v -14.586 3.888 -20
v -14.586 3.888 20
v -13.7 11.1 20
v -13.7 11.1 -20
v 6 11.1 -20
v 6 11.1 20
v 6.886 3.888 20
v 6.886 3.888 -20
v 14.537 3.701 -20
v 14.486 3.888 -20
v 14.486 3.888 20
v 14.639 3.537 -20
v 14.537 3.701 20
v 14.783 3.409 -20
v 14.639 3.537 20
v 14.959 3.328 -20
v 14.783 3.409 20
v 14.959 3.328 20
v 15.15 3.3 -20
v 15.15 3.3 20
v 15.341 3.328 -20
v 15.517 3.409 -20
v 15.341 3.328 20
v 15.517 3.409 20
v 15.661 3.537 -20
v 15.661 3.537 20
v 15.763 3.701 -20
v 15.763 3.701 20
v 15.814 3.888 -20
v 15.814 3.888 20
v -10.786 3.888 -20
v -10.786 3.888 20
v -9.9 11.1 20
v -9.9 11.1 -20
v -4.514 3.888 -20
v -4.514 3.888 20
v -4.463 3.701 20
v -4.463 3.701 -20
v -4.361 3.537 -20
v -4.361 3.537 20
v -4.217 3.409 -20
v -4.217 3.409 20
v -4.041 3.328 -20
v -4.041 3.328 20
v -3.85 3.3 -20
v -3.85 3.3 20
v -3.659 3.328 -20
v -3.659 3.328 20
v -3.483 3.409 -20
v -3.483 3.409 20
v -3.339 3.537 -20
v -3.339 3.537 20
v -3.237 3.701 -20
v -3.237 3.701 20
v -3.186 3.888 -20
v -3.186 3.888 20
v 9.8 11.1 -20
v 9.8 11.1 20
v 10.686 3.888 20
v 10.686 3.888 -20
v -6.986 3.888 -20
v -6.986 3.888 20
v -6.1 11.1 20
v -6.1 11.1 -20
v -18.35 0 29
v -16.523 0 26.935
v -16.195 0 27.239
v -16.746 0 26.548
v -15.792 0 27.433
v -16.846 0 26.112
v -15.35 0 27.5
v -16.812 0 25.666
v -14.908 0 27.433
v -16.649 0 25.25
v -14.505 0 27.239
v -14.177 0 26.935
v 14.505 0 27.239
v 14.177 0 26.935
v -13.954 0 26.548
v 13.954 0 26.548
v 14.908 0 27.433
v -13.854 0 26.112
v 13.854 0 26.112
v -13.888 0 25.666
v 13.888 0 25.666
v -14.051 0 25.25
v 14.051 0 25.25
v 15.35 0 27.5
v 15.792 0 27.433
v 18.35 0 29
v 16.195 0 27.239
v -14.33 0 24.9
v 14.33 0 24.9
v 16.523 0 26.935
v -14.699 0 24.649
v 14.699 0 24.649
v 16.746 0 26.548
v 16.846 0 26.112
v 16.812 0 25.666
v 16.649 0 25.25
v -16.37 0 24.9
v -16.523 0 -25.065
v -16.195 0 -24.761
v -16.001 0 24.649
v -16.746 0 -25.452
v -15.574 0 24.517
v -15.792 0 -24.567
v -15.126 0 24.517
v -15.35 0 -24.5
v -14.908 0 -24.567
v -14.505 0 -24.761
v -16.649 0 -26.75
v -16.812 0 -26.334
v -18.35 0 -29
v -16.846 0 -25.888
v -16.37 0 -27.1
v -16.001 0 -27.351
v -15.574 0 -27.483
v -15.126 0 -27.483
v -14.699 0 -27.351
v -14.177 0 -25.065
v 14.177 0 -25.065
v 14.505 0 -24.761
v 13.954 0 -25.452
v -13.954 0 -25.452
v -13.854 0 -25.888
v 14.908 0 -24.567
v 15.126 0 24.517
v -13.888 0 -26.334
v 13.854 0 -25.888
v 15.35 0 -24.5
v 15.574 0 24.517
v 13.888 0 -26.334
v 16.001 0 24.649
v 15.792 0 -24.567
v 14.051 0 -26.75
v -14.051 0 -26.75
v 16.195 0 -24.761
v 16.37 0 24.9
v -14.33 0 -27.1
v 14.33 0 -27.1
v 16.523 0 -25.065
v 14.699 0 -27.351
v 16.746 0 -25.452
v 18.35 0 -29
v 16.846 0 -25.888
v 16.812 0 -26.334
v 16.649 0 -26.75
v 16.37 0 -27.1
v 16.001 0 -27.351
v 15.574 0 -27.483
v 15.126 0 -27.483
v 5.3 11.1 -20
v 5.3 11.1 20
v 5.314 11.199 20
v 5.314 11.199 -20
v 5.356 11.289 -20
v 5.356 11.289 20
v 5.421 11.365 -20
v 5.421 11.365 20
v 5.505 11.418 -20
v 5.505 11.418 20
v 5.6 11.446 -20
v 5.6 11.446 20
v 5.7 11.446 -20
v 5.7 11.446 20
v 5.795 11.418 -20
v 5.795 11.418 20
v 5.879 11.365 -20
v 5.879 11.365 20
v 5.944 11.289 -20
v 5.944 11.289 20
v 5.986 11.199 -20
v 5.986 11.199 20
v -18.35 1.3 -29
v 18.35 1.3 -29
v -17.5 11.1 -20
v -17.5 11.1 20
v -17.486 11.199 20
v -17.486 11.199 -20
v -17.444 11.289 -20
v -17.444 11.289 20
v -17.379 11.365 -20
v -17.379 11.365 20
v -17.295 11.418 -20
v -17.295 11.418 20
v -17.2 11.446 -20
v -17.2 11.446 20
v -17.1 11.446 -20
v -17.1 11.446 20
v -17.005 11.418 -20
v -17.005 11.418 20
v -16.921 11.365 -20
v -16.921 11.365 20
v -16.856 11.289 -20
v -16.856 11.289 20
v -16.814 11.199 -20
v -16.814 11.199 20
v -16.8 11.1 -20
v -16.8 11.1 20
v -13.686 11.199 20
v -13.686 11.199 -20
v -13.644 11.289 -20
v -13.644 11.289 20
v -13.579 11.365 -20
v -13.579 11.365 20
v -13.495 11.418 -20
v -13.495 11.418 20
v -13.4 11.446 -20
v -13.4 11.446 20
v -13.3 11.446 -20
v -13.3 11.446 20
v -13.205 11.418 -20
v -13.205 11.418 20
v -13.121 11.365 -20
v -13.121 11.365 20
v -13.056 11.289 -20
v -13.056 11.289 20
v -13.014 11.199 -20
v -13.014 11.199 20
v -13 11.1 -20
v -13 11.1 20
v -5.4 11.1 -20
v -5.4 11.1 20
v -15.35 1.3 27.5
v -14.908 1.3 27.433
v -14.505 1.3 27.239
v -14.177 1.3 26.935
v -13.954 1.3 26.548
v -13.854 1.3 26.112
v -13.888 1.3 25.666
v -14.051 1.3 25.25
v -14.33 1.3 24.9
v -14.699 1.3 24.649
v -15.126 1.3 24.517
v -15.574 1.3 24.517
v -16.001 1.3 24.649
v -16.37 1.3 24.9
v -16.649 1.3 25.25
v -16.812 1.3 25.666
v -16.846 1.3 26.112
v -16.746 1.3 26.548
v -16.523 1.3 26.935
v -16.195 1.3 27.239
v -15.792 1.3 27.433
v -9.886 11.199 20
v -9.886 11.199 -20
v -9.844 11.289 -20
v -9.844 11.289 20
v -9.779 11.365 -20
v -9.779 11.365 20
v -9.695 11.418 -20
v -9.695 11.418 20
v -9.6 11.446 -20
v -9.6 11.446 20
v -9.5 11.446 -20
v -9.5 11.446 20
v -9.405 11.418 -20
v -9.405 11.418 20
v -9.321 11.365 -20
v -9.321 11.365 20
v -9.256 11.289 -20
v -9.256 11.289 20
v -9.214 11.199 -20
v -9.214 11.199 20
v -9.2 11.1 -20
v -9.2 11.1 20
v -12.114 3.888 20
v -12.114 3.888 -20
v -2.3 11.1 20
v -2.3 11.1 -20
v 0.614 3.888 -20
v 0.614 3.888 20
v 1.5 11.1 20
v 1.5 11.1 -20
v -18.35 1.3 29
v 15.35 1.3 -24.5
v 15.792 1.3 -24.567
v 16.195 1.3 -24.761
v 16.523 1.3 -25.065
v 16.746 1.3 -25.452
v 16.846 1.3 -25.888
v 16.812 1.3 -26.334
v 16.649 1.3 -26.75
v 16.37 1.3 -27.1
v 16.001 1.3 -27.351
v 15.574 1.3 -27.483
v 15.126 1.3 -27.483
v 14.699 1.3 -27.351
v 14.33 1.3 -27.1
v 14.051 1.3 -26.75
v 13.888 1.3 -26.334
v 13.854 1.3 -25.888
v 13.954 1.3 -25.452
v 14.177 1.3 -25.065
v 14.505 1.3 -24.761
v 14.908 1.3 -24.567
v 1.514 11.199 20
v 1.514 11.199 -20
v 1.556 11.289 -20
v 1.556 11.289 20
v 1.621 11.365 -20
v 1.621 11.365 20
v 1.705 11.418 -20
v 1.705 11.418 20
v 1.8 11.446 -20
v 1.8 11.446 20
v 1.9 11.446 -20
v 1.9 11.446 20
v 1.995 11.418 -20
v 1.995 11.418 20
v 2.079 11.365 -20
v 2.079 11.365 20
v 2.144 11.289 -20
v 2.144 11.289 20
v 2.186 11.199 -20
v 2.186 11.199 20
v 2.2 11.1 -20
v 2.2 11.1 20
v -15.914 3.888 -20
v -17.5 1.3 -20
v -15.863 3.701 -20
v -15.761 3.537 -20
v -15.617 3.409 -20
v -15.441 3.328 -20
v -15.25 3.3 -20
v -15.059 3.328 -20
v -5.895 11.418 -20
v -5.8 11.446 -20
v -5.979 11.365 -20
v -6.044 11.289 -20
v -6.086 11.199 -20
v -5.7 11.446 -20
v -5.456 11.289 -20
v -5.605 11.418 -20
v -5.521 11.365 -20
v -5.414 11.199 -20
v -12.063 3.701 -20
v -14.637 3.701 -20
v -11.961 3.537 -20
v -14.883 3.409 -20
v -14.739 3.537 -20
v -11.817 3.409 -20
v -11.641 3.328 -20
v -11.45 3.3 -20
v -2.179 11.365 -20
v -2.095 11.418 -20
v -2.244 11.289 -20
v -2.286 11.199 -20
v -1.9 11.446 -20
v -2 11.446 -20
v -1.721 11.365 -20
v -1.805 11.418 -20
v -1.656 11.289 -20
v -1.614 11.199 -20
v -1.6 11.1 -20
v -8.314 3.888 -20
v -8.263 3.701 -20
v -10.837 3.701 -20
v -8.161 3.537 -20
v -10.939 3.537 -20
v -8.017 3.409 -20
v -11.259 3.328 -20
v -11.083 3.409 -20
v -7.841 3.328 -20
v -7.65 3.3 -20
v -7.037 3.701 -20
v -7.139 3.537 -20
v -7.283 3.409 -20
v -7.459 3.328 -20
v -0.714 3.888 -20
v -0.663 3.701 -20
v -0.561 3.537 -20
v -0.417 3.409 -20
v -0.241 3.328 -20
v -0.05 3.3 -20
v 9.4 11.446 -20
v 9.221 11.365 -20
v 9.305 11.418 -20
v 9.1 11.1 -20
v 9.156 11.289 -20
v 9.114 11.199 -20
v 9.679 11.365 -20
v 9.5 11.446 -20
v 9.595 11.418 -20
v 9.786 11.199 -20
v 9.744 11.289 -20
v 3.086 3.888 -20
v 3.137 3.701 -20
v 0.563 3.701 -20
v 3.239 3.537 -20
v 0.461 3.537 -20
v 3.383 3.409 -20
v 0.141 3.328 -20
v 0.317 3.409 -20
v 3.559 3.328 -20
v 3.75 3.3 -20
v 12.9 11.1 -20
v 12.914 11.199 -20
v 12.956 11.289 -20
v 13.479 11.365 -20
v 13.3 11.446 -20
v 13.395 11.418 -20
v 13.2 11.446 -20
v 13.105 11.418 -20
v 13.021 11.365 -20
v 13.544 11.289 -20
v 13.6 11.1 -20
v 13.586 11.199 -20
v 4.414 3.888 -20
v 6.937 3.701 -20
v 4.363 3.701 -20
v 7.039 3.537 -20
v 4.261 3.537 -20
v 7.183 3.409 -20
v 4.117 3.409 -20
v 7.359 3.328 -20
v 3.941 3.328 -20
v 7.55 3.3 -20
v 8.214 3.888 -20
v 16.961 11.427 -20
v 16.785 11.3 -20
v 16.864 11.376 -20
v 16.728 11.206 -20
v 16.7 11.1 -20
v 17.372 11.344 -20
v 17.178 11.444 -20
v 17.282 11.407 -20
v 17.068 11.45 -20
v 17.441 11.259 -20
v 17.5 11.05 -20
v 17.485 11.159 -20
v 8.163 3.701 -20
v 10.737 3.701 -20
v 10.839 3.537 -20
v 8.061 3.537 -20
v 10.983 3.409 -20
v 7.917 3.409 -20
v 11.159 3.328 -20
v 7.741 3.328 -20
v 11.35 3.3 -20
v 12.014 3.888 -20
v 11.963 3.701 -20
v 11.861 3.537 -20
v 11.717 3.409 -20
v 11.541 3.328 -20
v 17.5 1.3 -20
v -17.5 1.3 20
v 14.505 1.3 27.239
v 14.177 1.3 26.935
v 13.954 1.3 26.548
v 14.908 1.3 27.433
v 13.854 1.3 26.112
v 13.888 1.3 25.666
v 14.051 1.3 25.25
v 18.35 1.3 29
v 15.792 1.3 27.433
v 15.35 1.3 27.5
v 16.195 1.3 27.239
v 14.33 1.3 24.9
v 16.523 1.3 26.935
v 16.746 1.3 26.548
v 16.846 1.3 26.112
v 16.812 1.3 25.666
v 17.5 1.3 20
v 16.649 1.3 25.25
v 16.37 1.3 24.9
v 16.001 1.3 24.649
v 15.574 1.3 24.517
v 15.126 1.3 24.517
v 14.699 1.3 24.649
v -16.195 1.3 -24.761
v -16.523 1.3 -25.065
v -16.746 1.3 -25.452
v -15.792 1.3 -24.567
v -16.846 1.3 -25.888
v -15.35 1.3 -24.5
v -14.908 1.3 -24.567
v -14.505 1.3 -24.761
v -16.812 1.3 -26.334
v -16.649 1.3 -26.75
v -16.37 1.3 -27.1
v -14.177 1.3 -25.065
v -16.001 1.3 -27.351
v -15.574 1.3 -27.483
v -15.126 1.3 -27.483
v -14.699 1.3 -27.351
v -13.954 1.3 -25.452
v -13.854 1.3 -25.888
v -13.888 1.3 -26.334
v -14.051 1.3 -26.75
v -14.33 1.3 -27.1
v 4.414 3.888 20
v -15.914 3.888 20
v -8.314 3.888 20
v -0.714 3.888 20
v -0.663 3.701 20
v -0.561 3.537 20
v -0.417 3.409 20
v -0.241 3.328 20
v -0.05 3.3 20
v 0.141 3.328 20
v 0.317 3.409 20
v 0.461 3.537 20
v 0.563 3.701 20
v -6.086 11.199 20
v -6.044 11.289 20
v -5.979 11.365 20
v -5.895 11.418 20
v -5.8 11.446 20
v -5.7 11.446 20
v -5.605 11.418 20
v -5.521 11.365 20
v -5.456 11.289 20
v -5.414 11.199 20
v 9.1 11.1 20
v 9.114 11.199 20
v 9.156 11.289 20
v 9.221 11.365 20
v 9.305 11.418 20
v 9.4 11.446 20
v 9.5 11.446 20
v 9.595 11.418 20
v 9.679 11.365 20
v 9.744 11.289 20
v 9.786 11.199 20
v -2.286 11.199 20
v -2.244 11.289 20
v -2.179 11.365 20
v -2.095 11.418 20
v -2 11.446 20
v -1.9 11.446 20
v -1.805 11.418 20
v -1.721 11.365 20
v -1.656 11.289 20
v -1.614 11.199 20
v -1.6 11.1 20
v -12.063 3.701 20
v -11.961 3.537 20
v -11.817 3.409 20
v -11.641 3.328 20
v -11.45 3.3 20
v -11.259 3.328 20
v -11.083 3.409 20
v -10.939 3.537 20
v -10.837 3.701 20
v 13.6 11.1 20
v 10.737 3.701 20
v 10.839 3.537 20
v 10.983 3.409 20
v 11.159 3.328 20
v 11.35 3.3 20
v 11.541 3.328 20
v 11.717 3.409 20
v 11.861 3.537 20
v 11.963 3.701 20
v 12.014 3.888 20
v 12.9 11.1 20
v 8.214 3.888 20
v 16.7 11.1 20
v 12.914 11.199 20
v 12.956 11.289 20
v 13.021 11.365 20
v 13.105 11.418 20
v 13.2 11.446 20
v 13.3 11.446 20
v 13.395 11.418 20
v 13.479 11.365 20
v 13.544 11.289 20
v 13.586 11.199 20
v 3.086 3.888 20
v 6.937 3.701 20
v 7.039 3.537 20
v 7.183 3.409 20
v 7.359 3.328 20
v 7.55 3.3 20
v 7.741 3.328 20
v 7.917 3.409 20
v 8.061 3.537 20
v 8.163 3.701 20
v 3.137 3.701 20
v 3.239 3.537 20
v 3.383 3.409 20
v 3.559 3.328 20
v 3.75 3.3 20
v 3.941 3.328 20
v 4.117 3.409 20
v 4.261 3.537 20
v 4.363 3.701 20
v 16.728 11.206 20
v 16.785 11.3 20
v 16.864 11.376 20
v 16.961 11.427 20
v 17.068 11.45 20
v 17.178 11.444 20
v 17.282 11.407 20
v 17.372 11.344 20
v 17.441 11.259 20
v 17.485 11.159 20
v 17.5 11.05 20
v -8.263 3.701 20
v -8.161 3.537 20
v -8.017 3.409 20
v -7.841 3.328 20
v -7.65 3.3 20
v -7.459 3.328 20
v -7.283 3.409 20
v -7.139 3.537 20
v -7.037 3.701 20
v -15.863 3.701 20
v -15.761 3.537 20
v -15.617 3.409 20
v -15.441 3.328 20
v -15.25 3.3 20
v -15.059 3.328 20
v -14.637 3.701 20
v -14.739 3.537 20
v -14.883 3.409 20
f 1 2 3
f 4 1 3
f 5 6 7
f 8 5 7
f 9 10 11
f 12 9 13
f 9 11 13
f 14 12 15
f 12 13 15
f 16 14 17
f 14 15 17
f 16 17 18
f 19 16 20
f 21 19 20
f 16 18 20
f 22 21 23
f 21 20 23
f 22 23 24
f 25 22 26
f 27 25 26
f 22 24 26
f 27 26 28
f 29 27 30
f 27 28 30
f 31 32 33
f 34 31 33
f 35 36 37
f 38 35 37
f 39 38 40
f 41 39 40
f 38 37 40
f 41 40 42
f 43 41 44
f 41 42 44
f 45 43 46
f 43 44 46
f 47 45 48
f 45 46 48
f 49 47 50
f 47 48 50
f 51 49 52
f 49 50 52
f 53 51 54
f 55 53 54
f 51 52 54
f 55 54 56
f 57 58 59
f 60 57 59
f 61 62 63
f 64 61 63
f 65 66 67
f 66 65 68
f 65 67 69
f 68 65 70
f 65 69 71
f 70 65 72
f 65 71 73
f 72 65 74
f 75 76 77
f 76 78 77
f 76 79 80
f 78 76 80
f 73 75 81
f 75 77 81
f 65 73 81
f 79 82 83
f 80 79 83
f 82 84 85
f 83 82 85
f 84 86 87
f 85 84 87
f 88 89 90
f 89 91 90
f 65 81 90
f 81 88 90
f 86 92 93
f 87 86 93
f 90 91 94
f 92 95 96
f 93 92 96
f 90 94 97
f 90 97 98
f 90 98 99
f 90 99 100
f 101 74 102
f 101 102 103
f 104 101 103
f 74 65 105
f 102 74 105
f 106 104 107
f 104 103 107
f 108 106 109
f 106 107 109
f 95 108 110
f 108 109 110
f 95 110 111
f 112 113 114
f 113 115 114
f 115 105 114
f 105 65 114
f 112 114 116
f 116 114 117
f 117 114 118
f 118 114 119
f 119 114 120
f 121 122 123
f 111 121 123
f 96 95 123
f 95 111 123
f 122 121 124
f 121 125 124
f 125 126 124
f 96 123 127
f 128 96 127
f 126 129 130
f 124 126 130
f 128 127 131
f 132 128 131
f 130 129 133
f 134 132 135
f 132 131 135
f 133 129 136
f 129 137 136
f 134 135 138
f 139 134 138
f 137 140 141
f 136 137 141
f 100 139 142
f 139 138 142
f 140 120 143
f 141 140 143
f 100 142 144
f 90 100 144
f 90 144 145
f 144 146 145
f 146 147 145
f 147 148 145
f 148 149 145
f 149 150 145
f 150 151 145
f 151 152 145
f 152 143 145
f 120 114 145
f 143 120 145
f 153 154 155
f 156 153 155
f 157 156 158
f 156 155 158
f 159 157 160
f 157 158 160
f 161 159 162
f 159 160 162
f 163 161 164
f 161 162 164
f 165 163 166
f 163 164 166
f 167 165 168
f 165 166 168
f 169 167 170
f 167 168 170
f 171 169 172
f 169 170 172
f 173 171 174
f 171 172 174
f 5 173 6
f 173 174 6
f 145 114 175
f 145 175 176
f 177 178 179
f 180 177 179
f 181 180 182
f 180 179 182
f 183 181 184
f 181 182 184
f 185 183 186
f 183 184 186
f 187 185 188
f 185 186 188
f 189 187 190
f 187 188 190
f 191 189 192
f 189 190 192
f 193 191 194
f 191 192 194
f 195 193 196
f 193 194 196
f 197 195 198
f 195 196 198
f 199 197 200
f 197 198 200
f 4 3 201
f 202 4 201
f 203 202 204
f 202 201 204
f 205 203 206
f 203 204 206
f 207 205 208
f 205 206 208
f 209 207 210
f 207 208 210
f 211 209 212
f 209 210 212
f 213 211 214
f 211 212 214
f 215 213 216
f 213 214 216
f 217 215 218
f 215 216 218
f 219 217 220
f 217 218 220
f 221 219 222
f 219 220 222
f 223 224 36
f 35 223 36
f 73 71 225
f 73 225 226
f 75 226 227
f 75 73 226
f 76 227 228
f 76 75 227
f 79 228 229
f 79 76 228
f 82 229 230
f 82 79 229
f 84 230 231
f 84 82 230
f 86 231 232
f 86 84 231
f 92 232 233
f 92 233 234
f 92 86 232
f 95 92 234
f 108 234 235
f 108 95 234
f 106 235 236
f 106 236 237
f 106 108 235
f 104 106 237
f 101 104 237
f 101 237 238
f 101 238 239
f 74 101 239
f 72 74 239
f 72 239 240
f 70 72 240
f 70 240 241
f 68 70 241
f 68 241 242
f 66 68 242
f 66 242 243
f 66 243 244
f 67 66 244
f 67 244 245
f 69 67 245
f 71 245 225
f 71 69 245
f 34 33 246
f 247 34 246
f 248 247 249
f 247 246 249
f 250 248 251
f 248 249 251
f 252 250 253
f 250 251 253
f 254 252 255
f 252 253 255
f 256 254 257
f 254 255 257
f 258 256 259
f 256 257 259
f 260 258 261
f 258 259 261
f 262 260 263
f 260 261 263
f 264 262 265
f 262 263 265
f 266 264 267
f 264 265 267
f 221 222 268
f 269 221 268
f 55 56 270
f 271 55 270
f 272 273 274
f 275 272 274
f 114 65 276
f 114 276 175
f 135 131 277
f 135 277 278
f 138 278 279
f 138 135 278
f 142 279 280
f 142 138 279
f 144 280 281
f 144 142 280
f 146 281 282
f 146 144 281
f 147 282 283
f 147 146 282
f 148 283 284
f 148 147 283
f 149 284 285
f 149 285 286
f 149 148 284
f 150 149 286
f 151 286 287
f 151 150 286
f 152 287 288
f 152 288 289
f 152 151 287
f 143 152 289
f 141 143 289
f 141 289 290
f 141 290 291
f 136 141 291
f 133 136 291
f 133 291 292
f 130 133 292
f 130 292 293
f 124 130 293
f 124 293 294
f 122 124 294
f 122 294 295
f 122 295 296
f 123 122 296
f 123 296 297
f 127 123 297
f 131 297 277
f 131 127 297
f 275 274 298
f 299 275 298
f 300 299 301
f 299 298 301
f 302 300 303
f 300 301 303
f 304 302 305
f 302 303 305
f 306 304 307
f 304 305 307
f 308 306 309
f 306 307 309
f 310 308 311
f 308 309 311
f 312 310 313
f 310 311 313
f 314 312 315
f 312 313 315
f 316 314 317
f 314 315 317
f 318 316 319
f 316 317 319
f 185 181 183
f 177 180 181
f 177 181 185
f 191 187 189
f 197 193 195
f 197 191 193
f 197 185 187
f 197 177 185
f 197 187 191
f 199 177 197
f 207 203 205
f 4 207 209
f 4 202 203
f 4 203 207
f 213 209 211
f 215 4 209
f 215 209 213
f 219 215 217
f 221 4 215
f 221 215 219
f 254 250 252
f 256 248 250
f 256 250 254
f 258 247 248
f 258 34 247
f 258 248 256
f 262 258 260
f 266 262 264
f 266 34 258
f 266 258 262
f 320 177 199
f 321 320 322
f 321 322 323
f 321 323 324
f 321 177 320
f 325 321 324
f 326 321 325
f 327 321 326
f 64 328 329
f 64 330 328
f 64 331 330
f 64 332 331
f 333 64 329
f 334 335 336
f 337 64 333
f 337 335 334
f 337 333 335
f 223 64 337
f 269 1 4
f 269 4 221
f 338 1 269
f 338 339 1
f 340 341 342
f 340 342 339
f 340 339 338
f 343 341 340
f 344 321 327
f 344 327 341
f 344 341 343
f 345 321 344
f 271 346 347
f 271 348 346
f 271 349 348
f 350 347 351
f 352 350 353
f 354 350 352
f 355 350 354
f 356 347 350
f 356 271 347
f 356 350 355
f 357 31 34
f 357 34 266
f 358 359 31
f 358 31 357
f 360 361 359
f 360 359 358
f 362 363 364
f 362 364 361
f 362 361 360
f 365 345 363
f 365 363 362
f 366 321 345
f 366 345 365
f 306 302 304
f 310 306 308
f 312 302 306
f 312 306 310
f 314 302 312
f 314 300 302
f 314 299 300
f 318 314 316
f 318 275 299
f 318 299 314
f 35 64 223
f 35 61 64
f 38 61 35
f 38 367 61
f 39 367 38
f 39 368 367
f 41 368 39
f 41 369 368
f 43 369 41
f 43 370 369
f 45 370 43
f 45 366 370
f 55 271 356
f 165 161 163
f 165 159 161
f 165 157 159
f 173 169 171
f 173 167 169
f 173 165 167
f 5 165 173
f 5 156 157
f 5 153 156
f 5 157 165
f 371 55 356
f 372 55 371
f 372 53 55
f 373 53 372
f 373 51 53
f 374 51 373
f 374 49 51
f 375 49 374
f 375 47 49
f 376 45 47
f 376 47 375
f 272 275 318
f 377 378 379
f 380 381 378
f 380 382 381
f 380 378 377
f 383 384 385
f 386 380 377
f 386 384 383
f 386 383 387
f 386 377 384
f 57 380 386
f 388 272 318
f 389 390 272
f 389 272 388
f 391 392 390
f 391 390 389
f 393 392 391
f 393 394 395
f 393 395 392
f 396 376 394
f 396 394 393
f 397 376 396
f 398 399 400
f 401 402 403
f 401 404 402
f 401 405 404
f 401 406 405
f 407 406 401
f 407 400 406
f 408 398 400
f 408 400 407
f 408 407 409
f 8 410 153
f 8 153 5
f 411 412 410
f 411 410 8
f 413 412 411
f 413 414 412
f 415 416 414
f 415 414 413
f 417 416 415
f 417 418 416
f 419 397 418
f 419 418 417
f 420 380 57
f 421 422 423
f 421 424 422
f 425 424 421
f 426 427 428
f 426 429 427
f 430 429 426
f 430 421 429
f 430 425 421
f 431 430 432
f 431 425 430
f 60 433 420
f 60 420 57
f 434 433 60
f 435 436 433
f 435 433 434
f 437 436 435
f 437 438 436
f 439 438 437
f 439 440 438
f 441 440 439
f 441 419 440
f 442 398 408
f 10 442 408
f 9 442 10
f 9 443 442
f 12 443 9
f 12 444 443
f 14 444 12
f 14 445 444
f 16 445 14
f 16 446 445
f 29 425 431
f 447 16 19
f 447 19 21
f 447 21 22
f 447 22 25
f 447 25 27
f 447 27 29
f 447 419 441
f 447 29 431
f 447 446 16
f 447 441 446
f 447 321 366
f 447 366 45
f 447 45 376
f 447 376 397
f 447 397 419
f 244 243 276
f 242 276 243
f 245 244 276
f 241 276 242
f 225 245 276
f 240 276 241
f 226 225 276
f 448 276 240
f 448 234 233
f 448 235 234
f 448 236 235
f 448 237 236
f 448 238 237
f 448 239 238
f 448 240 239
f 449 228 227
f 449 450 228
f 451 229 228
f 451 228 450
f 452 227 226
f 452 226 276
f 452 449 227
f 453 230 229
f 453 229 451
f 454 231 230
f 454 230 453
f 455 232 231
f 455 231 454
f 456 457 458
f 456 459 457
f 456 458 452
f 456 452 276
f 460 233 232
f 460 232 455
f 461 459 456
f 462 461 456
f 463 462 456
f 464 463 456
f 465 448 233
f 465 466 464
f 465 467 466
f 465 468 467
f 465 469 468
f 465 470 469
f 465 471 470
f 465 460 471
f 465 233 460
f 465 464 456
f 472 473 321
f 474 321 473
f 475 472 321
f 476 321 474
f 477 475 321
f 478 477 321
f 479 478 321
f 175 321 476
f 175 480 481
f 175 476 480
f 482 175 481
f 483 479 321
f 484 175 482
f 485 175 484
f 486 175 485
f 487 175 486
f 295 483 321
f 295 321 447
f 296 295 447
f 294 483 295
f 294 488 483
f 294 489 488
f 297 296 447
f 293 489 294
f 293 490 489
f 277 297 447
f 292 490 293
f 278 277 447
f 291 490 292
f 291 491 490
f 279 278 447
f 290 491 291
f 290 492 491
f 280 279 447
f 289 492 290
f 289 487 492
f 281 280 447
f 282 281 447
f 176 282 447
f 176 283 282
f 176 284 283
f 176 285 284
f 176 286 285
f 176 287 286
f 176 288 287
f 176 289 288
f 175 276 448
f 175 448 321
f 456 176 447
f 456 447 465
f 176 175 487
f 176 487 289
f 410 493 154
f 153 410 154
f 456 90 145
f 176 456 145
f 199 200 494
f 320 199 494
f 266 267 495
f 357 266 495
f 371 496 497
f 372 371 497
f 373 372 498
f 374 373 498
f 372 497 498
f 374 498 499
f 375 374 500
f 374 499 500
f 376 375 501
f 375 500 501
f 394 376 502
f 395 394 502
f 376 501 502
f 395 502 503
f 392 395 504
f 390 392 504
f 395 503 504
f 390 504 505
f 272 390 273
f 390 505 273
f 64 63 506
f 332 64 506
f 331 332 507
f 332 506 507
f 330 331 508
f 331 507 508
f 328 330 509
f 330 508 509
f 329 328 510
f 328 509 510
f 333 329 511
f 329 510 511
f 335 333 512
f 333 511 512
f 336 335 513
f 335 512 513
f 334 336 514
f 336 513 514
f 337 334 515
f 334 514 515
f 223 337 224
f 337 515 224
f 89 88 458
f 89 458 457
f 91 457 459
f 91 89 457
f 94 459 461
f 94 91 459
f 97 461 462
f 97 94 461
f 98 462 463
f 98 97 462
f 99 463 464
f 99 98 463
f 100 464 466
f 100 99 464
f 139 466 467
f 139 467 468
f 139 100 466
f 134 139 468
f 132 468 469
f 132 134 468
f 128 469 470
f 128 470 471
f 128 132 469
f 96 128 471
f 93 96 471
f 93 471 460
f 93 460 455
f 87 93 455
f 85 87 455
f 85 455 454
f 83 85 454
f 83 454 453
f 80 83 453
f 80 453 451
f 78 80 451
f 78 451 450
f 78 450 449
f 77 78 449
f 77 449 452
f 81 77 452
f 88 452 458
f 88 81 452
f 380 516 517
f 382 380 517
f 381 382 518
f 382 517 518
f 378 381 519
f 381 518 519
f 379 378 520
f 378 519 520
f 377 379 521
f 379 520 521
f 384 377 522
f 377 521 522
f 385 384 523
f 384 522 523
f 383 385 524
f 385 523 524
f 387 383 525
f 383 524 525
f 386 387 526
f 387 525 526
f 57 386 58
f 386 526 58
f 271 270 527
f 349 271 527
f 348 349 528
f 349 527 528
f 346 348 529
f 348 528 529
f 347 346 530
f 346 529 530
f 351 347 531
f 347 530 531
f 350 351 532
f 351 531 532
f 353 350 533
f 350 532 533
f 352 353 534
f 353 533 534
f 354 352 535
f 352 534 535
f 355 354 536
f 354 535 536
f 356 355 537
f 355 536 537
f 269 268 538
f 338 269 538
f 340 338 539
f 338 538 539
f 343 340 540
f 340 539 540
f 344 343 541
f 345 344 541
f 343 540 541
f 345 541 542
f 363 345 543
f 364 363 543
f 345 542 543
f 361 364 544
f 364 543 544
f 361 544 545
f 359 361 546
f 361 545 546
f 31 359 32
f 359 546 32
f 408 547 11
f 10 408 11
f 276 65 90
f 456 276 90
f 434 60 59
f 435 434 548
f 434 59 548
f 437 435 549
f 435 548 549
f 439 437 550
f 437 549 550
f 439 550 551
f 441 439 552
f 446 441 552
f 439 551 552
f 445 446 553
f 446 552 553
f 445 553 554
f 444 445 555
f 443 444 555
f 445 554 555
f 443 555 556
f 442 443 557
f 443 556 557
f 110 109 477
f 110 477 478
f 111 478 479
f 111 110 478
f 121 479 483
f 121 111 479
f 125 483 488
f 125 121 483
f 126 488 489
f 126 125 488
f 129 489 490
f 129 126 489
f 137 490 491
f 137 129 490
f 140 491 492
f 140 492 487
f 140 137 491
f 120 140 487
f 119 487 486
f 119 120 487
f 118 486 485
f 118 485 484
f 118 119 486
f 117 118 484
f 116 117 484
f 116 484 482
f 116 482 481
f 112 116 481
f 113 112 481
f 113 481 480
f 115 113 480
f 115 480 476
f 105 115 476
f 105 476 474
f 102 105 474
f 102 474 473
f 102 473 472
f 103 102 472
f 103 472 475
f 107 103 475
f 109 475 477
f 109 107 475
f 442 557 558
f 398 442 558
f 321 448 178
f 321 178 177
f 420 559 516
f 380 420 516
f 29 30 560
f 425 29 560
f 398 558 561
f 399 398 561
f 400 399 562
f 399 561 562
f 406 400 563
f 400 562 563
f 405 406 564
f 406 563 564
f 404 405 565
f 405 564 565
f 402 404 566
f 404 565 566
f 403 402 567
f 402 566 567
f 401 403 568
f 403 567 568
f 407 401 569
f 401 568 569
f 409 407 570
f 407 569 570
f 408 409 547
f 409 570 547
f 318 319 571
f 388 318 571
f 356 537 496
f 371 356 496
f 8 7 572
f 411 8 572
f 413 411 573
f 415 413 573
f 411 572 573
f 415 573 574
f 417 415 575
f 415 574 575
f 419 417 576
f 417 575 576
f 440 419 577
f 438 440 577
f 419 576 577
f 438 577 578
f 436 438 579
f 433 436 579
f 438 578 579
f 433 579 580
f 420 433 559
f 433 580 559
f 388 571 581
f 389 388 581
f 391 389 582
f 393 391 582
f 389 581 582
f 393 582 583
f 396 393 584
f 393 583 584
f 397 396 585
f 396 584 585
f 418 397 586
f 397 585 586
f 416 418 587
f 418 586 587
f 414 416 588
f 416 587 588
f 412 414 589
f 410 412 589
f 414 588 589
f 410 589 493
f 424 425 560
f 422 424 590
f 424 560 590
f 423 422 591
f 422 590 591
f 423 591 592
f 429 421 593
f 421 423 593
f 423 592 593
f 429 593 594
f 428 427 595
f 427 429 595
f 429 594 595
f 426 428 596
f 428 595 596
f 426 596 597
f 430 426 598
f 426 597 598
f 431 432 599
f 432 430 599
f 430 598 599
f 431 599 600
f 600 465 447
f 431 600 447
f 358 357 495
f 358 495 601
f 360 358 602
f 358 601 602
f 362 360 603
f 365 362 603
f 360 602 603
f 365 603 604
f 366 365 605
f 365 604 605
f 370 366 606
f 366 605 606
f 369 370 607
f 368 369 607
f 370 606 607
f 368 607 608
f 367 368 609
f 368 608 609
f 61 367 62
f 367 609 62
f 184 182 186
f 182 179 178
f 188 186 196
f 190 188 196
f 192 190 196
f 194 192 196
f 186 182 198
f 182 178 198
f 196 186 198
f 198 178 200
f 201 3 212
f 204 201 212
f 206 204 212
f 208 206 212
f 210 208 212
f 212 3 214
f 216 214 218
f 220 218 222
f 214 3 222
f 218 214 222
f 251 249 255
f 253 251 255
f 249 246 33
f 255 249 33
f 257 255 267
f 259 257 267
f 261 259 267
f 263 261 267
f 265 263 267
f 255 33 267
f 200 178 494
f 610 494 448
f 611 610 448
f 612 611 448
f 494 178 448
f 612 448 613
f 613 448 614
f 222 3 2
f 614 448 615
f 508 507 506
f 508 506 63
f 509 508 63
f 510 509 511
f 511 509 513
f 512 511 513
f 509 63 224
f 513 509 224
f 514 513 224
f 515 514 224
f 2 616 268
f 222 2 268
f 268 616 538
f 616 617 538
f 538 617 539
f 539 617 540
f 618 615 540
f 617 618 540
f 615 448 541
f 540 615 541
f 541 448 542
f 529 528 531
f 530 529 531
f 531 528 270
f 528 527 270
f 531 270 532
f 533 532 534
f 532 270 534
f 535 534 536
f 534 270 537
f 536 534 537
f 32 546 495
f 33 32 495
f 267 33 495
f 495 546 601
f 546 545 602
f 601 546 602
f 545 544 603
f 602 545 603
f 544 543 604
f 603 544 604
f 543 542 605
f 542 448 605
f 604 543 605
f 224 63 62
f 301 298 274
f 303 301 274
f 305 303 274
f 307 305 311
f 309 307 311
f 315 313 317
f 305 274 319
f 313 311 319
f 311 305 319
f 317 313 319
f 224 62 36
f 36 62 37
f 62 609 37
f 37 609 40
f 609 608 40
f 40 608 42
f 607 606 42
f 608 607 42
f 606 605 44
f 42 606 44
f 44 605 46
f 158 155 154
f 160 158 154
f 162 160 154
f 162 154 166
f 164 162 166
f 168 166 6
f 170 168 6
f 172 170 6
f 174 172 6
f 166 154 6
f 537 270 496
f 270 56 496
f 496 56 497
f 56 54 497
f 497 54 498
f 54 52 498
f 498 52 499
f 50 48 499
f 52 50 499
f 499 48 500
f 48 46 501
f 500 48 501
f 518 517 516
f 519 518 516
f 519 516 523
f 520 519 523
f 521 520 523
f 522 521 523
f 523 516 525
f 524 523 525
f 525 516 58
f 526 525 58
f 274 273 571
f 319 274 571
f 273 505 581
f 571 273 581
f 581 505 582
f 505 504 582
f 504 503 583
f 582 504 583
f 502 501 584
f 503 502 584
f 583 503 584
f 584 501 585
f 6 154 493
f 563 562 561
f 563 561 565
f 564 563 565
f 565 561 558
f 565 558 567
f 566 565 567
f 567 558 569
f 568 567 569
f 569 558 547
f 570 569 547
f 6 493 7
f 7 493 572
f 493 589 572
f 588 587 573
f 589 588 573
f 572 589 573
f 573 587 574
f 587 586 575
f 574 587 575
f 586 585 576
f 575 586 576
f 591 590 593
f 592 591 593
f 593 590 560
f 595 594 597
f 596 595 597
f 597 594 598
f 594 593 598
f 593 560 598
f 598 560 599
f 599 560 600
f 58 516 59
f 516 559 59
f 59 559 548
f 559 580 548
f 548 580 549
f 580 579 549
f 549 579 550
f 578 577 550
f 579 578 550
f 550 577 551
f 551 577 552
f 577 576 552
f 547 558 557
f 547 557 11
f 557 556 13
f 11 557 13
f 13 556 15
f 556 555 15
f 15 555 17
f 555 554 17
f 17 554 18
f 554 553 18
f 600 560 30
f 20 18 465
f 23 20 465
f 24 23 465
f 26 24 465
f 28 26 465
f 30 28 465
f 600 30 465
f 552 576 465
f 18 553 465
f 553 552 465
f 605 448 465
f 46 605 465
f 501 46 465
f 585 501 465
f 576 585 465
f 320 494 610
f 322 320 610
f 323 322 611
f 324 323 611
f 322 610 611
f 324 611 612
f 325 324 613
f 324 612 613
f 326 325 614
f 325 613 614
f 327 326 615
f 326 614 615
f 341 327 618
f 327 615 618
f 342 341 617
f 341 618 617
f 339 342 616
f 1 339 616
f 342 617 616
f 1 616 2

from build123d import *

# Parameters (mm, degrees)
CROQUIS1_W              = 36.7
CROQUIS1_H              = 58
CROQUIS1_R              = 1.5
SALIENTE_EXTRUIR1_DEPTH = 1.3
CROQUIS2_W              = 35
CROQUIS2_H              = 40
SALIENTE_EXTRUIR2_DEPTH = 10.2
CORTAR_EXTRUIR1_DEPTH   = 54.572124281


with BuildPart() as part:
    # Croquis1 → Saliente-Extruir1 (new body)
    with BuildSketch(Plane(origin=(0, 0, 0), x_dir=(1, 0, 0), z_dir=(0, 1, 0))):
        Rectangle(CROQUIS1_W, CROQUIS1_H)
        with Locations(Location((15.35, 26, 0), (0, 0, 270))):
            Circle(CROQUIS1_R, mode=Mode.SUBTRACT)
        with Locations(Location((-15.35, 26, 0), (0, 0, 270))):
            Circle(CROQUIS1_R, mode=Mode.SUBTRACT)
        with Locations(Location((-15.35, -26, 0), (0, 0, 270))):
            Circle(CROQUIS1_R, mode=Mode.SUBTRACT)
        with Locations(Location((15.35, -26, 0), (0, 0, 270))):
            Circle(CROQUIS1_R, mode=Mode.SUBTRACT)
    extrude(amount=SALIENTE_EXTRUIR1_DEPTH)

    # Croquis2 → Saliente-Extruir2 (add)
    with BuildSketch(Plane(origin=(0, 1.3, 0), x_dir=(1, 0, 0), z_dir=(0, 1, 0))):
        Rectangle(CROQUIS2_W, CROQUIS2_H)
    extrude(amount=SALIENTE_EXTRUIR2_DEPTH)

    # Croquis3 → Cortar-Extruir1 (cut, through all)
    with BuildSketch(Plane.XY.offset(20)):
        with BuildLine():
            Line((-16.8, 11.1), (-15.914461251, 3.887865656))
            ThreePointArc((-15.914461251, 3.887865656), (-15.25, 3.3), (-14.585538749, 3.887865656))
            Line((-14.585538749, 3.887865656), (-13.7, 11.1))
            ThreePointArc((-13.7, 11.1), (-13.35, 11.45), (-13, 11.1))
            Line((-13, 11.1), (-12.114461251, 3.887865656))
            ThreePointArc((-12.114461251, 3.887865656), (-11.45, 3.3), (-10.785538749, 3.887865656))
            Line((-10.785538749, 3.887865656), (-9.9, 11.1))
            ThreePointArc((-9.9, 11.1), (-9.55, 11.45), (-9.2, 11.1))
            Line((-9.2, 11.1), (-8.314461251, 3.887865656))
            ThreePointArc((-8.314461251, 3.887865656), (-7.65, 3.3), (-6.985538749, 3.887865656))
            Line((-6.985538749, 3.887865656), (-6.1, 11.1))
            ThreePointArc((-6.1, 11.1), (-5.75, 11.45), (-5.4, 11.1))
            Line((-5.4, 11.1), (-4.514461251, 3.887865656))
            ThreePointArc((-4.514461251, 3.887865656), (-3.85, 3.3), (-3.185538749, 3.887865656))
            Line((-3.185538749, 3.887865656), (-2.3, 11.1))
            ThreePointArc((-2.3, 11.1), (-1.95, 11.45), (-1.6, 11.1))
            Line((-1.6, 11.1), (-0.714461251, 3.887865656))
            ThreePointArc((-0.714461251, 3.887865656), (-0.05, 3.3), (0.614461251, 3.887865656))
            Line((0.614461251, 3.887865656), (1.5, 11.1))
            ThreePointArc((1.5, 11.1), (1.85, 11.45), (2.2, 11.1))
            Line((2.2, 11.1), (3.085538749, 3.887865656))
            ThreePointArc((3.085538749, 3.887865656), (3.75, 3.3), (4.414461251, 3.887865656))
            Line((4.414461251, 3.887865656), (5.3, 11.1))
            ThreePointArc((5.3, 11.1), (5.65, 11.45), (6, 11.1))
            Line((6, 11.1), (6.885538749, 3.887865656))
            ThreePointArc((6.885538749, 3.887865656), (7.55, 3.3), (8.214461251, 3.887865656))
            Line((8.214461251, 3.887865656), (9.1, 11.1))
            ThreePointArc((9.1, 11.1), (9.45, 11.45), (9.8, 11.1))
            Line((9.8, 11.1), (10.685538749, 3.887865656))
            ThreePointArc((10.685538749, 3.887865656), (11.35, 3.3), (12.014461251, 3.887865656))
            Line((12.014461251, 3.887865656), (12.9, 11.1))
            ThreePointArc((12.9, 11.1), (13.25, 11.45), (13.6, 11.1))
            Line((13.6, 11.1), (14.485538749, 3.887865656))
            ThreePointArc((14.485538749, 3.887865656), (15.15, 3.3), (15.814461251, 3.887865656))
            Line((15.814461251, 3.887865656), (16.7, 11.1))
            ThreePointArc((16.7, 11.1), (17.123486281, 11.450780489), (17.5, 11.05))
            Line((17.5, 11.05), (17.5, 11.5))
            Line((17.5, 11.5), (-17.5, 11.5))
            Line((-17.5, 11.5), (-17.5, 11.1))
            ThreePointArc((-17.5, 11.1), (-17.15, 11.45), (-16.8, 11.1))
        make_face()
    extrude(amount=-CORTAR_EXTRUIR1_DEPTH, mode=Mode.SUBTRACT)


solid = part.part
